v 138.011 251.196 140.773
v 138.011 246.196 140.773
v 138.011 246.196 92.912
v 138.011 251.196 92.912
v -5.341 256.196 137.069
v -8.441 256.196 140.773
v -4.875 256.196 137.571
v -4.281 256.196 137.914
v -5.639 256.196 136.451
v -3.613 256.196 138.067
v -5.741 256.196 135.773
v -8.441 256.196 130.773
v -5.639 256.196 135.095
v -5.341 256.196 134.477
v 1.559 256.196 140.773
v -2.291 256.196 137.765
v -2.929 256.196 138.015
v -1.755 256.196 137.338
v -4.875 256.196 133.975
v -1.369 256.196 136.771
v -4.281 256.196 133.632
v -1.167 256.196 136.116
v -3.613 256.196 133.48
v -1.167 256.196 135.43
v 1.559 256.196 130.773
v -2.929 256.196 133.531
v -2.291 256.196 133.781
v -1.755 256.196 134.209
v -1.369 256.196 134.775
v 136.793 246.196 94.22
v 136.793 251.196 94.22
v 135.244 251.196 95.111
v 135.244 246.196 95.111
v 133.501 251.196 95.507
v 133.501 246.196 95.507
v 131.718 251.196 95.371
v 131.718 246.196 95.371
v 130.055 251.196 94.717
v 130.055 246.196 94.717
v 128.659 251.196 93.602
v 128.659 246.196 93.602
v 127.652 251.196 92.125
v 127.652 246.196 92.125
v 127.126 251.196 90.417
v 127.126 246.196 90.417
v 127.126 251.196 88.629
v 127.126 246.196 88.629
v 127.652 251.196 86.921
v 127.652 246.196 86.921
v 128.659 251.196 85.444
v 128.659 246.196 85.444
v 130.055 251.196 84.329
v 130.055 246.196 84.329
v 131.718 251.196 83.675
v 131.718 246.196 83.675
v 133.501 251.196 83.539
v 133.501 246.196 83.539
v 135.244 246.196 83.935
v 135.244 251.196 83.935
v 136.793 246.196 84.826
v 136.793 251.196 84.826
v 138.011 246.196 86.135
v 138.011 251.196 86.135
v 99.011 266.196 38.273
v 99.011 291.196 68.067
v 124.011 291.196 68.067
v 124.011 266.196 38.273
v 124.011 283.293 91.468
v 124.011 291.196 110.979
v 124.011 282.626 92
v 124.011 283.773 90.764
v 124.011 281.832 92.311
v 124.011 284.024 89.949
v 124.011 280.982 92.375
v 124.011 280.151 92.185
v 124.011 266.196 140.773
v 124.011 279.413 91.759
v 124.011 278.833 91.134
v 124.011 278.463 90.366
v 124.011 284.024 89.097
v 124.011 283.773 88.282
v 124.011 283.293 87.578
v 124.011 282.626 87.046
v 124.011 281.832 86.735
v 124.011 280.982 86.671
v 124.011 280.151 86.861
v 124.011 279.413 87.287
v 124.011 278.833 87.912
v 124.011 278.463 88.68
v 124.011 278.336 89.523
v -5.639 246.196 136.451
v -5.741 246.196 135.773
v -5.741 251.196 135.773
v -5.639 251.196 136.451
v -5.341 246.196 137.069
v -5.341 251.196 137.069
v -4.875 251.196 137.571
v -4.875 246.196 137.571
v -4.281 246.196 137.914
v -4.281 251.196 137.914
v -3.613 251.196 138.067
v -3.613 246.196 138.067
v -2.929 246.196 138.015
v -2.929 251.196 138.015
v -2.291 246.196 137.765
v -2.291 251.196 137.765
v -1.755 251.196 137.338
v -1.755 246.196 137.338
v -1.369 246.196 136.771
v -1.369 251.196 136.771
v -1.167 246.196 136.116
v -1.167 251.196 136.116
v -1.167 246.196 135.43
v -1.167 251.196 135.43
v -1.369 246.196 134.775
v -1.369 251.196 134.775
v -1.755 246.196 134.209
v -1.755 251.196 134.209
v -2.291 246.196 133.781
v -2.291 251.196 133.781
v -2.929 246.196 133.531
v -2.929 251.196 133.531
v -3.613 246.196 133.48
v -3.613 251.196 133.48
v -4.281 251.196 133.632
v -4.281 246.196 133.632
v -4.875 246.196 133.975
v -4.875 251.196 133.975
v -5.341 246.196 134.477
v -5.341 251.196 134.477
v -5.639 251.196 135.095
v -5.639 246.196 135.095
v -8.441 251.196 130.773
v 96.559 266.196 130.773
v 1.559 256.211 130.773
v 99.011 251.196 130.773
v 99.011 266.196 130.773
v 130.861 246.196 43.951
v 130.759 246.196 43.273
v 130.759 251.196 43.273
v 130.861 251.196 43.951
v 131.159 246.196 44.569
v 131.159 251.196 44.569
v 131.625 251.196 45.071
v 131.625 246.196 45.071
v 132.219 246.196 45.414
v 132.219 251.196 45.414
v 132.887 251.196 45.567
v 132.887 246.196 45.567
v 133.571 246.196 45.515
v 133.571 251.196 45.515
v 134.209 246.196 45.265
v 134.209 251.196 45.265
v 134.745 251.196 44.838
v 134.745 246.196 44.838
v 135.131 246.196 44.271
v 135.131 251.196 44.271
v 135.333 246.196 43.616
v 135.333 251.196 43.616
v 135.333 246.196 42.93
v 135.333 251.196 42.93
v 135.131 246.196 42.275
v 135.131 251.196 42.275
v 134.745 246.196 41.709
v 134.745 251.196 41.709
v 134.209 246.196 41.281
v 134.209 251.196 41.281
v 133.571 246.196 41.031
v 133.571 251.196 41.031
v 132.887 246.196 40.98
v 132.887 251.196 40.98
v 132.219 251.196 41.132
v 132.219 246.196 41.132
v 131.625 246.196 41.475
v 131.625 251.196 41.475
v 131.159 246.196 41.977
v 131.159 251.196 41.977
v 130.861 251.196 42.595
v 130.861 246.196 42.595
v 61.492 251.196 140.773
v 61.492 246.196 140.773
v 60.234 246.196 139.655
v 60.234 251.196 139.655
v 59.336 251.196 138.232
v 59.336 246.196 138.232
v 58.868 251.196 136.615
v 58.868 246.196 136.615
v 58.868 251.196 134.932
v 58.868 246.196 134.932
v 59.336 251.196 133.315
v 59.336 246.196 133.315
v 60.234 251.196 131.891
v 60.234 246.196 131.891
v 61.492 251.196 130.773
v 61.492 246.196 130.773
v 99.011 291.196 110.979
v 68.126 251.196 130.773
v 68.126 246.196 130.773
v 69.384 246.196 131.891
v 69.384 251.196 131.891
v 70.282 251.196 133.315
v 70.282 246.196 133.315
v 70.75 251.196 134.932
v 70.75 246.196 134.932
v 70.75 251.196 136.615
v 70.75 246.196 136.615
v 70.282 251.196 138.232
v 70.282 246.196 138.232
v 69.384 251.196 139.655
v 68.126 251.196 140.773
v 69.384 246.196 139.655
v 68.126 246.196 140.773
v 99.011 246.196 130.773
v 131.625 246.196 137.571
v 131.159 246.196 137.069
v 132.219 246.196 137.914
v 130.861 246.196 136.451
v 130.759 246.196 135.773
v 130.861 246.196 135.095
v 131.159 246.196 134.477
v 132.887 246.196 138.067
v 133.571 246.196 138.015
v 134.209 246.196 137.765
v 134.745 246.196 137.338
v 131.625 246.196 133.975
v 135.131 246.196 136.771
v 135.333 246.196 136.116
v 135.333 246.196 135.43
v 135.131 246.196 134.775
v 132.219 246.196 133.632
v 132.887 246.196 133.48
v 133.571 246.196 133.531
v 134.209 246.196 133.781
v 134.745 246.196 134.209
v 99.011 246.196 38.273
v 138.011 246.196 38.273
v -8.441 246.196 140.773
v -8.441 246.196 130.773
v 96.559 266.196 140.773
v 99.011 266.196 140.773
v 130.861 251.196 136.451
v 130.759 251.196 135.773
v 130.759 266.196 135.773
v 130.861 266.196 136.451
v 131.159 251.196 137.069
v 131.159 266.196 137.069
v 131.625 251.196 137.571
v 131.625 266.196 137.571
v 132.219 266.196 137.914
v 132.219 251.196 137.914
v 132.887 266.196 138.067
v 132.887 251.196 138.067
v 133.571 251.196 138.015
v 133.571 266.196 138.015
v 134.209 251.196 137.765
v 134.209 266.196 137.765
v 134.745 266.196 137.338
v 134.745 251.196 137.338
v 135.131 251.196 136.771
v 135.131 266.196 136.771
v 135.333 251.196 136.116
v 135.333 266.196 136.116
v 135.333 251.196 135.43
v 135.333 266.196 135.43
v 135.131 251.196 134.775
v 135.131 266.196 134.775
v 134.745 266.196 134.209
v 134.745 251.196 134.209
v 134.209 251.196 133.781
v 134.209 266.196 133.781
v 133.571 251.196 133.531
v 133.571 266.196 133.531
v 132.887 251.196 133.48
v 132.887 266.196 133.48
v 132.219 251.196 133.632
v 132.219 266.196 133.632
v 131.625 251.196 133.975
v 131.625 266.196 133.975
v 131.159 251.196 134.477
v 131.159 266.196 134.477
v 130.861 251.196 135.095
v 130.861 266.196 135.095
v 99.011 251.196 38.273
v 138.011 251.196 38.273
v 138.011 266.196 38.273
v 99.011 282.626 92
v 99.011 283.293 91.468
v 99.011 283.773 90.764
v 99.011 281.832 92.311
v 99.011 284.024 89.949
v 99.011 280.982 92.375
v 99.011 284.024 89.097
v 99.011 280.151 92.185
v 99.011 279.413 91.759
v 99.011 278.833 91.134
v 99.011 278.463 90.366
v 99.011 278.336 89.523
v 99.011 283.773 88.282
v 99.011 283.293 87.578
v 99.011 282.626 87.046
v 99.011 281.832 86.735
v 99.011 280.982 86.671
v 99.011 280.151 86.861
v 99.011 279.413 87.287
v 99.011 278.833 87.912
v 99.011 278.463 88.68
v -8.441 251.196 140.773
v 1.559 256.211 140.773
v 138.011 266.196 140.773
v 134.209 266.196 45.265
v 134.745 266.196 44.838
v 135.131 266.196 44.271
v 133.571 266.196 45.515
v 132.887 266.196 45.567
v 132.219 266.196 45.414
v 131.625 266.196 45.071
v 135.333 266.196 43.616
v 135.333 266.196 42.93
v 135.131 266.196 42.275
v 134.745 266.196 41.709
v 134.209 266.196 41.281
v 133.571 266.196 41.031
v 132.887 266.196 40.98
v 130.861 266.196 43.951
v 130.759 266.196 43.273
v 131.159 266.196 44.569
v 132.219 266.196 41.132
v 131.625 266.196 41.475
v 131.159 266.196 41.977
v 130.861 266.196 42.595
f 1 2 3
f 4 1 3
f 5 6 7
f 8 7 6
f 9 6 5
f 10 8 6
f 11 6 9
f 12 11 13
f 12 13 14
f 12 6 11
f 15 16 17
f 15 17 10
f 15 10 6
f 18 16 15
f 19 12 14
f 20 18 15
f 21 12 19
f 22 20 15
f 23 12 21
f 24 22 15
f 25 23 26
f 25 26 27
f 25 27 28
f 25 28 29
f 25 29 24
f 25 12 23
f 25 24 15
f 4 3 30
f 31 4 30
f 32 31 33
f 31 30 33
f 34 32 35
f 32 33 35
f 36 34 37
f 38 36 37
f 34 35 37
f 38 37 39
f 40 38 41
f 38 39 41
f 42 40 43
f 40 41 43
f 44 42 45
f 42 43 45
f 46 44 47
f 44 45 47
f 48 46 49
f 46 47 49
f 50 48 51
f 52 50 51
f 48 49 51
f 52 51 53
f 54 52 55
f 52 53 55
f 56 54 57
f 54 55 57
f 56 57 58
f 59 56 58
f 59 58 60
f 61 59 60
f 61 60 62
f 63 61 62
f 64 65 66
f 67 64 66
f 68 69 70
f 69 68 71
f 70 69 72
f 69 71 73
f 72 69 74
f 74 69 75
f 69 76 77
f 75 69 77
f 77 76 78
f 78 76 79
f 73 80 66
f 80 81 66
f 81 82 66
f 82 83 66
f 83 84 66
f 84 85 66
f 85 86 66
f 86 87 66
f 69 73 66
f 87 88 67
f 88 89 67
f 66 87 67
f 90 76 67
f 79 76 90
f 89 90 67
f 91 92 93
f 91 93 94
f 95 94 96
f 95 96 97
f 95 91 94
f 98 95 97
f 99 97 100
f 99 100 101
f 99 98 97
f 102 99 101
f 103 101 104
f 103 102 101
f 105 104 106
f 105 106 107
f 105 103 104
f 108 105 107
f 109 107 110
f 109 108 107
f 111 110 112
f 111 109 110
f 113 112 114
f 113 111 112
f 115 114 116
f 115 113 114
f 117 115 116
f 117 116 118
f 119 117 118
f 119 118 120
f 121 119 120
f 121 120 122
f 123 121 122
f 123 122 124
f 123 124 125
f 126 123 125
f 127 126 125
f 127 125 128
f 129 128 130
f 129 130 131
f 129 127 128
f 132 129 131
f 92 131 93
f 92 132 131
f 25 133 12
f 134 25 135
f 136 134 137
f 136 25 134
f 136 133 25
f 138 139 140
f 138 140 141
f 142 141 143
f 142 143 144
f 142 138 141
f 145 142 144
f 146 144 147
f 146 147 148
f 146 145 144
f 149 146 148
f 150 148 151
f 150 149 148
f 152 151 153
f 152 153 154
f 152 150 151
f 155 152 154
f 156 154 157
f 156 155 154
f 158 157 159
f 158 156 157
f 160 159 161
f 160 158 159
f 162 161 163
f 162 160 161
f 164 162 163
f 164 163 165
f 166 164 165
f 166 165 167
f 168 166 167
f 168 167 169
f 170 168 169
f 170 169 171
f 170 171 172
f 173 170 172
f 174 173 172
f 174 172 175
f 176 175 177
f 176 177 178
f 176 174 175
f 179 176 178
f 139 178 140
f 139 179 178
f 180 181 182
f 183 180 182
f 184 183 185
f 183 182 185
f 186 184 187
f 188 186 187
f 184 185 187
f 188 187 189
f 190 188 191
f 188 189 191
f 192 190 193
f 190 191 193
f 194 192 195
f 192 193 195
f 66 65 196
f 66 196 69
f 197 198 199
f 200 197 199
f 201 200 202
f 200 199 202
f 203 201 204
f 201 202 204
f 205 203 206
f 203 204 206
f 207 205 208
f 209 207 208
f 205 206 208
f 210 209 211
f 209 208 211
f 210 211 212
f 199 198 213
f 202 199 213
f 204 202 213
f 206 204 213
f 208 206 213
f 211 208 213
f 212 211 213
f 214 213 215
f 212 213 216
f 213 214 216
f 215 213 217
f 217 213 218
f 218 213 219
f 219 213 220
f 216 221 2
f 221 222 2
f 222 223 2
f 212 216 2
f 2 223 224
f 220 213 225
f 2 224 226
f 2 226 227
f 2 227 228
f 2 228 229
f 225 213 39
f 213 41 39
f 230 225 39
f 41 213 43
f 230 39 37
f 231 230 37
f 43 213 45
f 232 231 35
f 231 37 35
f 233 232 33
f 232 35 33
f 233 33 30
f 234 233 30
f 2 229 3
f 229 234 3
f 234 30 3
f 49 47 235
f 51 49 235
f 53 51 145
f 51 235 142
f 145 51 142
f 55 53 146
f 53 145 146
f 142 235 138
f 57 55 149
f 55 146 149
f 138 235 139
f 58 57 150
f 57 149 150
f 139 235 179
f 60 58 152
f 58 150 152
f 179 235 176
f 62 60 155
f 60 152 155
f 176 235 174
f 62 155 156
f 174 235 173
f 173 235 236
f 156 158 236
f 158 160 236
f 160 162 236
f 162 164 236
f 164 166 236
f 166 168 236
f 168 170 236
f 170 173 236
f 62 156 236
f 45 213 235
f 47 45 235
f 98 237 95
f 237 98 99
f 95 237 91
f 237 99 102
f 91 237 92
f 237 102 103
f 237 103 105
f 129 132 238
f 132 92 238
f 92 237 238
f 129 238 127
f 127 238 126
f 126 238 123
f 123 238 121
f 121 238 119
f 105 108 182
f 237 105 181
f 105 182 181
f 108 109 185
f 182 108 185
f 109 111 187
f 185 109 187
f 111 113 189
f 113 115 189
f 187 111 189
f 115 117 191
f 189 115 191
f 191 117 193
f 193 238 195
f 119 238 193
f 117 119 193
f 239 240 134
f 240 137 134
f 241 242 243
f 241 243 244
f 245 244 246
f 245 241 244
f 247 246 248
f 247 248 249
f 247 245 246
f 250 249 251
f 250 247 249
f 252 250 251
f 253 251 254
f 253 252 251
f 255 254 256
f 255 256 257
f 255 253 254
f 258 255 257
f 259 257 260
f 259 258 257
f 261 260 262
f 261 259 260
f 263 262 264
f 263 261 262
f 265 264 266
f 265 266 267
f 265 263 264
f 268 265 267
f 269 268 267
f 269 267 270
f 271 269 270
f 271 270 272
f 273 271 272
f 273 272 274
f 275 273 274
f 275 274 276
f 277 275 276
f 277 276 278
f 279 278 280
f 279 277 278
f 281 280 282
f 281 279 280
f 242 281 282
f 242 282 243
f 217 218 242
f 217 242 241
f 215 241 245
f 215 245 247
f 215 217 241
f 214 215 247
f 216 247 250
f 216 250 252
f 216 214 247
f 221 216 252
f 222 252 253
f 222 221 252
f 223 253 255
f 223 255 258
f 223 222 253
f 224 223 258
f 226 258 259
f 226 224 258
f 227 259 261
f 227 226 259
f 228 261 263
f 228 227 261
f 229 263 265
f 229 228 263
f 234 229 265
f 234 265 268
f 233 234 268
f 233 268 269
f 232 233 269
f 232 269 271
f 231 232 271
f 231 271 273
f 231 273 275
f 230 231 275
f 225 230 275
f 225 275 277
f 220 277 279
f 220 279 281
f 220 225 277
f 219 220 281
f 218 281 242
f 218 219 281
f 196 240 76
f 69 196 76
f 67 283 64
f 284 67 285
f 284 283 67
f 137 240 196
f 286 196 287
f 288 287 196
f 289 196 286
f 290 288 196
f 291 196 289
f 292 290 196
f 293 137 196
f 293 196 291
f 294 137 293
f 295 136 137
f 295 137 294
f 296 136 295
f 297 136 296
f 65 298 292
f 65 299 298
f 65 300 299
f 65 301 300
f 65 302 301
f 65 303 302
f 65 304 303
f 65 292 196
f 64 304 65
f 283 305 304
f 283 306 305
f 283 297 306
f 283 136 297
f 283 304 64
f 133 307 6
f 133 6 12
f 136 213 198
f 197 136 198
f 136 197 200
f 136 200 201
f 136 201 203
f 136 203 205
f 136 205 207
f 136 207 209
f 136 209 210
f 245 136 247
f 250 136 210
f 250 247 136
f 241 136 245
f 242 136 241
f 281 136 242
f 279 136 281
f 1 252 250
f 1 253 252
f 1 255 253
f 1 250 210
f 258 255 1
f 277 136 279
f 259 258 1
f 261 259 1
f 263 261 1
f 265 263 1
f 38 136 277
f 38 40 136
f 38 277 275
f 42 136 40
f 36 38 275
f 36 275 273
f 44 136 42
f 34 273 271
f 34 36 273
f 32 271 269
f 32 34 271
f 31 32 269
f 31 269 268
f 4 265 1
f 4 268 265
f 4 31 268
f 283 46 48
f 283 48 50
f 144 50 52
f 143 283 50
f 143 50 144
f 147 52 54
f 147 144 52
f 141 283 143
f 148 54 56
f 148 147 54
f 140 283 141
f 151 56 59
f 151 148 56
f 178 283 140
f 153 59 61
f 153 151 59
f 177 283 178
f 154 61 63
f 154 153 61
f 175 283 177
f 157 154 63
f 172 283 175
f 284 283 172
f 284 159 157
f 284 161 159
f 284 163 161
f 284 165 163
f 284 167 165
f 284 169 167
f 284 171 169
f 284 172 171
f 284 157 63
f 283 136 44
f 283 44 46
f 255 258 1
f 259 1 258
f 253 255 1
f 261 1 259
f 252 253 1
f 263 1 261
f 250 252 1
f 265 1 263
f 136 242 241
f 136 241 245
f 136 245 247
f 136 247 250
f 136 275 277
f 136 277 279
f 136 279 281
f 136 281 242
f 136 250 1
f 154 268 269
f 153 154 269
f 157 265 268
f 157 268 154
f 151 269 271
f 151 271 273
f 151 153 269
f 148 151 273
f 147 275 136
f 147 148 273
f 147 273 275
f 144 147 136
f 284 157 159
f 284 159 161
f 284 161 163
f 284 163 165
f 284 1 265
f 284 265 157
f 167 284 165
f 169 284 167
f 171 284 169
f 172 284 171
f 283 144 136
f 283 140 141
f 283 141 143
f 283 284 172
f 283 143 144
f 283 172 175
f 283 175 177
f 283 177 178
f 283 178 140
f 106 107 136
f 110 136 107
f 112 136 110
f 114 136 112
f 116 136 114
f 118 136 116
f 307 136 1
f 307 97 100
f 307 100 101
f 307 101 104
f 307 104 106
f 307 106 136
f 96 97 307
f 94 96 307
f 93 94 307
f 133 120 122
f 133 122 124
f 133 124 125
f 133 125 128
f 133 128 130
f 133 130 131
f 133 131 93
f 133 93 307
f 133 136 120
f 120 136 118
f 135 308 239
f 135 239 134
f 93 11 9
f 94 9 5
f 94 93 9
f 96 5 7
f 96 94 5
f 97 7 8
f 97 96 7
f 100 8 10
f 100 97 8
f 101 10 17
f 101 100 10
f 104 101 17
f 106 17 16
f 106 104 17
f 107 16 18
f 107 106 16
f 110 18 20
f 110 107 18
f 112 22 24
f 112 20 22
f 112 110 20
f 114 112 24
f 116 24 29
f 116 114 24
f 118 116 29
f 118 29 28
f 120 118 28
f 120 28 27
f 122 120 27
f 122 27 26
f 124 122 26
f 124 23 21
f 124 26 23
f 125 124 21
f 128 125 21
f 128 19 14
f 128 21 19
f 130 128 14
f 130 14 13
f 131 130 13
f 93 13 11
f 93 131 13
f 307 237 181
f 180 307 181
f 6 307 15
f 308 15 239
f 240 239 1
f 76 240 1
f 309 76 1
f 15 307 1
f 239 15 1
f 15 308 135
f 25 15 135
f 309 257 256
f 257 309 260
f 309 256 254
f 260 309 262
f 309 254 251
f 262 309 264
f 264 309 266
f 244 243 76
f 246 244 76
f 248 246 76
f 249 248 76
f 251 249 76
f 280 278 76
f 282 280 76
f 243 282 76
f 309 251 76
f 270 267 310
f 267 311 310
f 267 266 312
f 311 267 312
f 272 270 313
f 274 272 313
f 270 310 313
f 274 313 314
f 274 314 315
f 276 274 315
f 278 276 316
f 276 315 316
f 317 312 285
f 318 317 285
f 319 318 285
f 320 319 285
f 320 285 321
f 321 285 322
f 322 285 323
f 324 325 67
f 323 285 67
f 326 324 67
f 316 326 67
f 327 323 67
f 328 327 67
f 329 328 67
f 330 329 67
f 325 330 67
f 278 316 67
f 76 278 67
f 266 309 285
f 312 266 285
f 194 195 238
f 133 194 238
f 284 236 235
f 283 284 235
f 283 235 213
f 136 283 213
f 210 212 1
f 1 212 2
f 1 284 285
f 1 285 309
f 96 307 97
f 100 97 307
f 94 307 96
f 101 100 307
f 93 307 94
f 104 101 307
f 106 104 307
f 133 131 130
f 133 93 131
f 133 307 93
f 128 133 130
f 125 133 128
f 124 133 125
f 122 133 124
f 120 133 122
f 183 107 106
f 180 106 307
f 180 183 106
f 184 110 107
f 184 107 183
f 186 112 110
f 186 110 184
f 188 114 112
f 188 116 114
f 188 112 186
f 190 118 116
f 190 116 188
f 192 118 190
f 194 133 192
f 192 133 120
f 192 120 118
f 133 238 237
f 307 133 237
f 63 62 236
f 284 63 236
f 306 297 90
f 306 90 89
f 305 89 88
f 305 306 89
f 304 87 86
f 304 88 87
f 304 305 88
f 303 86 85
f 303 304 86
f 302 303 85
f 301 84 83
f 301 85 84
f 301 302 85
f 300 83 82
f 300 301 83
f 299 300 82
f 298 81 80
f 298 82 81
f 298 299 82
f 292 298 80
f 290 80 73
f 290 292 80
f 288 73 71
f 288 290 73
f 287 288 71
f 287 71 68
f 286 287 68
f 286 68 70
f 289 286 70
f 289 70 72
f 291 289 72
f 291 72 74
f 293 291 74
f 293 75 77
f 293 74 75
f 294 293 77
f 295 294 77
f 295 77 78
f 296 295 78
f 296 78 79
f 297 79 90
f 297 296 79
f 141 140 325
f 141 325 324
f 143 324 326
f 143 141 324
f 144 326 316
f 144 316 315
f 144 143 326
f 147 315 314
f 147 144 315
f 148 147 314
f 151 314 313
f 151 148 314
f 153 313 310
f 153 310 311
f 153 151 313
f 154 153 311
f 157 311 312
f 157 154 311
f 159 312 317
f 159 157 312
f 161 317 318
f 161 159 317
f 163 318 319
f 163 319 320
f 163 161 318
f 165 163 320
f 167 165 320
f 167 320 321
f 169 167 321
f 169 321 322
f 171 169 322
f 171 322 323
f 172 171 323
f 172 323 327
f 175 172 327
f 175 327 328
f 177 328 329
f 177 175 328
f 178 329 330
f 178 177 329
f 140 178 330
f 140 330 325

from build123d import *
from OCP.BRepFilletAPI import BRepFilletAPI_MakeChamfer

# Parameters (mm, degrees)
SKETCH_1_R               = 2.3
EXTRUDE_1_DEPTH          = 5
EXTRUDE_1_2_DEPTH        = 5
SKETCH_2_R               = 2.3
EXTRUDE_2_DEPTH          = 15
SKETCH_3_W               = 25
SKETCH_3_H               = 102.5
EXTRUDE_3_DEPTH          = 25
CUT_EXTRUDE_1_DEPTH      = 350.507632875
CUT_EXTRUDE_1_DEPTH_BACK = 350.507632875
SKETCH_4_R               = 2.86
CHAMFER_1_SIZE           = 25
CHAMFER_1_SIZE2          = 29.793839815
SKETCH_5_W               = 10
SKETCH_5_H               = 10
CUT_EXTRUDE_2_DEPTH      = 10
CHAMFER_2_SIZE           = 95
CHAMFER_2_SIZE2          = 9.98490235


with BuildPart() as part:
    # Эскиз1 → Бобышка-Вытянуть1 (new body)
    with BuildSketch(Plane(origin=(0, 246.195974268, 0), x_dir=(1, 0, 0), z_dir=(0, 1, 0))):
        with BuildLine():
            Line((68.125605484, -140.773129836), (138.010541363, -140.773129836))
            Line((138.010541363, -140.773129836), (138.010541363, -92.911646759))
            ThreePointArc((138.010541363, -92.911646759), (127.058980694, -89.523129836), (138.010541363, -86.134612913))
            Line((138.010541363, -86.134612913), (138.010541363, -38.273129836))
            Line((138.010541363, -38.273129836), (99.010541363, -38.273129836))
            Line((99.010541363, -38.273129836), (99.010541363, -130.773129836))
            Line((99.010541363, -130.773129836), (68.125605484, -130.773129836))
            ThreePointArc((68.125605484, -130.773129836), (70.808980694, -135.773129836), (68.125605484, -140.773129836))
        make_face()
        with Locations(Location((133.058980694, -135.773129836, 0), (0, 0, 180))):
            Circle(SKETCH_1_R, mode=Mode.SUBTRACT)
        with Locations(Location((133.058980694, -43.273129836, 0), (0, 0, 180))):
            Circle(SKETCH_1_R, mode=Mode.SUBTRACT)
    extrude(amount=EXTRUDE_1_DEPTH)


with BuildPart() as body_2:
    # Эскиз1 → Extrude 1 2 (new body)
    with BuildSketch(Plane(origin=(0, 246.195974268, 0), x_dir=(1, 0, 0), z_dir=(0, 1, 0))):
        with BuildLine():
            Line((-8.441019306, -140.773129836), (61.492355904, -140.773129836))
            ThreePointArc((61.492355904, -140.773129836), (58.808980694, -135.773129836), (61.492355904, -130.773129836))
            Line((61.492355904, -130.773129836), (-8.441019306, -130.773129836))
            Line((-8.441019306, -130.773129836), (-8.441019306, -140.773129836))
        make_face()
        with Locations(Location((-3.441019306, -135.773129836, 0), (0, 0, 180))):
            Circle(SKETCH_1_R, mode=Mode.SUBTRACT)
    extrude(amount=EXTRUDE_1_2_DEPTH)


with BuildPart() as body_3:
    # Эскиз2 → Бобышка-Вытянуть2 (new body)
    with BuildSketch(Plane(origin=(0, 251.195974268, 0), x_dir=(1, 0, 0), z_dir=(0, 1, 0))):
        Polygon((99.010541363, -38.273129836), (138.010541363, -38.273129836), (138.010541363, -140.773129836), (-8.441019306, -140.773129836), (-8.441019306, -130.773129836), (99.010541363, -130.773129836), align=None)
        with Locations(Location((133.058980694, -43.273129836, 0), (0, 0, 180))):
            Circle(SKETCH_2_R, mode=Mode.SUBTRACT)
        with Locations(Location((133.058980694, -135.773129836, 0), (0, 0, 180))):
            Circle(SKETCH_2_R, mode=Mode.SUBTRACT)
        with Locations(Location((-3.441019306, -135.773129836, 0), (0, 0, 180))):
            Circle(SKETCH_2_R, mode=Mode.SUBTRACT)
    extrude(amount=EXTRUDE_2_DEPTH)

    # Эскиз3 → Бобышка-Вытянуть3 (add)
    with BuildSketch(Plane(origin=(0, 266.195974268, 0), x_dir=(1, 0, 0), z_dir=(0, 1, 0))):
        with Locations((111.510541363, -89.523129836)):
            Rectangle(SKETCH_3_W, SKETCH_3_H)
    extrude(amount=EXTRUDE_3_DEPTH)

    # Эскиз4 → Вырез-Вытянуть1 (cut, two sides: drawn at the far end of the back side and taken through both)
    with BuildSketch(Plane(origin=(124.010541363, 0, 0), x_dir=(0, 0, -1), z_dir=(1, 0, 0)).offset(-CUT_EXTRUDE_1_DEPTH_BACK)):
        with Locations(Location((-89.523129836, 281.195974268, 0), (0, 0, 270))):
            Circle(SKETCH_4_R)
    extrude(amount=CUT_EXTRUDE_1_DEPTH + CUT_EXTRUDE_1_DEPTH_BACK, mode=Mode.SUBTRACT)

    # Фаска1: one chamfer whose edges measure the first distance from different faces: ONE call of the kernel's chamfer builder (chamfer() names one face for all edges)
    chamfer_1_edges_1 = [body_3.edges().sort_by_distance(p)[0] for p in [
        (111.510541363, 291.195974268, 140.773129836),
    ]]
    chamfer_1_side_1 = [body_3.faces().sort_by_distance(p)[0] for p in [
        (75.134143656, 263.125812594, 140.773129836),
    ]]
    chamfer_1_edges_2 = [body_3.edges().sort_by_distance(p)[0] for p in [
        (111.510541363, 291.195974268, 38.273129836),
    ]]
    chamfer_1_side_2 = [body_3.faces().sort_by_distance(p)[0] for p in [
        (114.894838884, 269.02655278, 38.273129836),
    ]]
    chamfer_1 = BRepFilletAPI_MakeChamfer(body_3.part.solid().wrapped)
    for e in chamfer_1_edges_1:
        chamfer_1.Add(CHAMFER_1_SIZE, CHAMFER_1_SIZE2, e.wrapped, chamfer_1_side_1[0].wrapped)  # the first distance lies on this face
    for e in chamfer_1_edges_2:
        chamfer_1.Add(CHAMFER_1_SIZE, CHAMFER_1_SIZE2, e.wrapped, chamfer_1_side_2[0].wrapped)  # the first distance lies on this face
    add(Compound.cast(chamfer_1.Shape()), mode=Mode.REPLACE)

    # Эскиз5 → Вырез-Вытянуть2 (cut)
    with BuildSketch(Plane(origin=(0, 266.195974268, 0), x_dir=(1, 0, 0), z_dir=(0, 1, 0))):
        with Locations((-3.441019306, -135.773129836)):
            Rectangle(SKETCH_5_W, SKETCH_5_H)
    extrude(amount=-CUT_EXTRUDE_2_DEPTH, mode=Mode.SUBTRACT)

    # Фаска2
    chamfer_2_edges = [body_3.edges().sort_by_distance(p)[0] for p in [
        (1.558980694, 266.195974268, 135.773129836),
    ]]
    chamfer_2_side = [body_3.faces().sort_by_distance(p)[0] for p in [
        (50.284761029, 266.195974268, 135.773129836),
    ]]
    chamfer(chamfer_2_edges, length=CHAMFER_2_SIZE, length2=CHAMFER_2_SIZE2, reference=chamfer_2_side[0])


solid = Compound([part.part, body_2.part, body_3.part])
